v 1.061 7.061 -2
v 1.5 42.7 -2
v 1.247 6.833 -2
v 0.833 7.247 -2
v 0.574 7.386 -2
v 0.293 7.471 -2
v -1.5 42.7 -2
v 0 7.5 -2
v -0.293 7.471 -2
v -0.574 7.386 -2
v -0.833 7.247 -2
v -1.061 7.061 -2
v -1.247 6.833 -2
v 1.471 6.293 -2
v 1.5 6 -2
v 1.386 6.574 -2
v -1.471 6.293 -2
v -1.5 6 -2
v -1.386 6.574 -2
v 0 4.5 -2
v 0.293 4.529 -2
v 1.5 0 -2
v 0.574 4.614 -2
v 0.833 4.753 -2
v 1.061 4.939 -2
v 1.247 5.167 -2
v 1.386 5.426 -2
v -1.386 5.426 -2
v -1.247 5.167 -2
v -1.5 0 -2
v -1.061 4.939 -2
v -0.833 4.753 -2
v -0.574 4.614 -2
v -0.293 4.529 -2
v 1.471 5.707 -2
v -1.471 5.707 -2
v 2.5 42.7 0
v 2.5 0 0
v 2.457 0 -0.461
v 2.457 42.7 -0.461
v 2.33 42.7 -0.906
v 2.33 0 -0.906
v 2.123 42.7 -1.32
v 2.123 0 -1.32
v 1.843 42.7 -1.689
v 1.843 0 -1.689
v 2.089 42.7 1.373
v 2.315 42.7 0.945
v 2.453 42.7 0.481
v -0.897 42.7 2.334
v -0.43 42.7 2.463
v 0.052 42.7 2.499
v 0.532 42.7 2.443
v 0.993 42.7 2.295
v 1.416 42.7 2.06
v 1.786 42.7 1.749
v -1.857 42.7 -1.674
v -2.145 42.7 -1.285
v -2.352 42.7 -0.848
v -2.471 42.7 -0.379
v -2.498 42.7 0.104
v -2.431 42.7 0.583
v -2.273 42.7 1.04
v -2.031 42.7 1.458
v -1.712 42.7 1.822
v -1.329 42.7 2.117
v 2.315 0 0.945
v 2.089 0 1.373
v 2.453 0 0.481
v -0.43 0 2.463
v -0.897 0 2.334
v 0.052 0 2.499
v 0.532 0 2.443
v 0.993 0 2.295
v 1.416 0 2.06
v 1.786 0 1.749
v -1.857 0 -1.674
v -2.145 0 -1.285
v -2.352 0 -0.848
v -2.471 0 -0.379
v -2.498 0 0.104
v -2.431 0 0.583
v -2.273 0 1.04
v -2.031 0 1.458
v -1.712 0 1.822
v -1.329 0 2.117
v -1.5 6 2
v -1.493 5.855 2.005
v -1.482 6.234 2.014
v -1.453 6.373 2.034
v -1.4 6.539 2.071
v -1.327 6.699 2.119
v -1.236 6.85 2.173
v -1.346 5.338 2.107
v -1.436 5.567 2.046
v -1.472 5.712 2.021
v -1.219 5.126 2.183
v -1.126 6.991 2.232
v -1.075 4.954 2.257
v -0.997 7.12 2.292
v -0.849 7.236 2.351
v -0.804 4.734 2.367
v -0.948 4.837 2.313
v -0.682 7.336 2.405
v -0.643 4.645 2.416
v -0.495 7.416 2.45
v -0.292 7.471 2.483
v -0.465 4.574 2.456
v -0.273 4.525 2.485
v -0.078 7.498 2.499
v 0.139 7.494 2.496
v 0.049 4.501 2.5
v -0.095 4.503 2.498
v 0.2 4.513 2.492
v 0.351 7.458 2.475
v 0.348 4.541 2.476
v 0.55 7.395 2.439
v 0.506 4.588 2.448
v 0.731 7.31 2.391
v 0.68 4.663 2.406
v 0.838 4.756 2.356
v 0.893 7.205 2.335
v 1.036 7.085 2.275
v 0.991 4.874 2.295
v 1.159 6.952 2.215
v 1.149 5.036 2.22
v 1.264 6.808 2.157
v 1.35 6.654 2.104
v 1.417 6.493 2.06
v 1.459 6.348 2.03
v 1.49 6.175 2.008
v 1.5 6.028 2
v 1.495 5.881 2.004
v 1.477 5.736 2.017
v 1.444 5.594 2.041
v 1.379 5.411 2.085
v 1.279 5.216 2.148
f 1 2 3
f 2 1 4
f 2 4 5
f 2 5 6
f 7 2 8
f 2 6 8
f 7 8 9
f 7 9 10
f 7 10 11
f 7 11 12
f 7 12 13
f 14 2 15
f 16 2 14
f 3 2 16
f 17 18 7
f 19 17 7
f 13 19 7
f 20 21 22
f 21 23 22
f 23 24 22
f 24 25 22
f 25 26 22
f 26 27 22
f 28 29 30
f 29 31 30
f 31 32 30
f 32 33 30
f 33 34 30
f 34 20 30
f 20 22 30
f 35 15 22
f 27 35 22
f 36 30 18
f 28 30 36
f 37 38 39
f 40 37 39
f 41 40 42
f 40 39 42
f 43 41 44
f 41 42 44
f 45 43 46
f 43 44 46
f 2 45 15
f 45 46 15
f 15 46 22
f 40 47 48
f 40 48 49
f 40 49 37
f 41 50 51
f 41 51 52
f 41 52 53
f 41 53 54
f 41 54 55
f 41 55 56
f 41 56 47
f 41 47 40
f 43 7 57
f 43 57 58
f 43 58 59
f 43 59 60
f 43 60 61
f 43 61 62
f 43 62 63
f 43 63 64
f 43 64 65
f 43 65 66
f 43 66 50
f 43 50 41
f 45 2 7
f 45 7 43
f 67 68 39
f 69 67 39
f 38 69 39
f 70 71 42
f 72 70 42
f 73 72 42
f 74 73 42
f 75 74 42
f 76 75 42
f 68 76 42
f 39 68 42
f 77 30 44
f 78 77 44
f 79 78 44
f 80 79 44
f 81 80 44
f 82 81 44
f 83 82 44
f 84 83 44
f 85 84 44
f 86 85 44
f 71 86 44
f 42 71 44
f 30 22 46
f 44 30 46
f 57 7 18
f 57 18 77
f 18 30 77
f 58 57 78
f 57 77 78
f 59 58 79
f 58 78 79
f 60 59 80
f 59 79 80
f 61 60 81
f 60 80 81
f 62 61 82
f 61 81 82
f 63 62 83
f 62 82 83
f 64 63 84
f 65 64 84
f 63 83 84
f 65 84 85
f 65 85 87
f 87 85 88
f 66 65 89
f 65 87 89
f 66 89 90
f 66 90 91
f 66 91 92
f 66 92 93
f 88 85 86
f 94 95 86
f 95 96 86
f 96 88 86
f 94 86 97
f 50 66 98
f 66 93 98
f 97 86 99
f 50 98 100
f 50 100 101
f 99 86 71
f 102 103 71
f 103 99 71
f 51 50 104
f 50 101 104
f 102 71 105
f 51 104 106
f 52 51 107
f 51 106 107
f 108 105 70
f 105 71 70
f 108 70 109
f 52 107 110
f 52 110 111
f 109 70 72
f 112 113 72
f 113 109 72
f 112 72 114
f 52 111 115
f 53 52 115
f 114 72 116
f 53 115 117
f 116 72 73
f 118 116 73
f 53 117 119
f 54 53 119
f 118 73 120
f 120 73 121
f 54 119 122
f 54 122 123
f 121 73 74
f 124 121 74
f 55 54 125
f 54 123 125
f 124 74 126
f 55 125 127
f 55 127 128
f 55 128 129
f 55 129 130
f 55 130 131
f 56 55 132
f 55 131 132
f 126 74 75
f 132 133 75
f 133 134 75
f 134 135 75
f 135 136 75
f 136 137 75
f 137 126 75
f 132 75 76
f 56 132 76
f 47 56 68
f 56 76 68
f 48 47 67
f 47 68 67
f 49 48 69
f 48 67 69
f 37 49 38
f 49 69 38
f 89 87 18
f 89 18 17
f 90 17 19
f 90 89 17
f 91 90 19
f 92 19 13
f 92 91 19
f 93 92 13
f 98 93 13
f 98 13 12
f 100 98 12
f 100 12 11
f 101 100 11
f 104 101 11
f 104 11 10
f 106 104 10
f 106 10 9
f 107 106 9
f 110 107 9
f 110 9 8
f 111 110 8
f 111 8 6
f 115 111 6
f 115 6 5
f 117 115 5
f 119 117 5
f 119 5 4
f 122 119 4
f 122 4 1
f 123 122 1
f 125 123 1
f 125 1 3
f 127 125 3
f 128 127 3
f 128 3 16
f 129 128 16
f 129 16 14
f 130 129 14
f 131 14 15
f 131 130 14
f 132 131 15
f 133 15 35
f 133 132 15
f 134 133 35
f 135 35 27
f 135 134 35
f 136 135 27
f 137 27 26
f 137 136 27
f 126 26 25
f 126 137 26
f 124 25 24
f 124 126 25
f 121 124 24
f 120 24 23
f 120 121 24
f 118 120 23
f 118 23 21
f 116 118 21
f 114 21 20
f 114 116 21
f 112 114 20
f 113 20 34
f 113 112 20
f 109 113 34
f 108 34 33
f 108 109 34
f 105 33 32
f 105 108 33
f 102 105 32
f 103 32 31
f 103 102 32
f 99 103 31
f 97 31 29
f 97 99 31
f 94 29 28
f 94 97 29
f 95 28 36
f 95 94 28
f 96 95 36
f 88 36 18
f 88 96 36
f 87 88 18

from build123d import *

# Parameters (mm, degrees)
BOSS_EXTRUDE1_DEPTH     = 42.7
CUT_EXTRUDE1_DEPTH      = 44.009185066
CUT_EXTRUDE1_DEPTH_BACK = 44.009185066
SKETCH2_R               = 1.5


with BuildPart() as part:
    # Sketch1 → Boss-Extrude1 (new body)
    with BuildSketch(Plane(origin=(0, 0, 0), x_dir=(1, 0, 0), z_dir=(0, 1, 0))):
        with BuildLine():
            Line((1.5, 2), (-1.5, 2))
            ThreePointArc((-1.5, 2), (-1.118033989, -2.236067977), (2.5, 0))
            ThreePointArc((2.5, 0), (2.236067977, 1.118033989), (1.5, 2))
        make_face()
    extrude(amount=BOSS_EXTRUDE1_DEPTH)

    # Sketch2 → Cut-Extrude1 (cut, two sides: drawn at the far end of the back side and taken through both)
    with BuildSketch(Plane(origin=(0, 0, -2), x_dir=(-1, 0, 0), z_dir=(0, 0, -1)).offset(-CUT_EXTRUDE1_DEPTH_BACK)):
        with Locations((0, 6)):
            Circle(SKETCH2_R)
    extrude(amount=CUT_EXTRUDE1_DEPTH + CUT_EXTRUDE1_DEPTH_BACK, mode=Mode.SUBTRACT)


solid = part.part
